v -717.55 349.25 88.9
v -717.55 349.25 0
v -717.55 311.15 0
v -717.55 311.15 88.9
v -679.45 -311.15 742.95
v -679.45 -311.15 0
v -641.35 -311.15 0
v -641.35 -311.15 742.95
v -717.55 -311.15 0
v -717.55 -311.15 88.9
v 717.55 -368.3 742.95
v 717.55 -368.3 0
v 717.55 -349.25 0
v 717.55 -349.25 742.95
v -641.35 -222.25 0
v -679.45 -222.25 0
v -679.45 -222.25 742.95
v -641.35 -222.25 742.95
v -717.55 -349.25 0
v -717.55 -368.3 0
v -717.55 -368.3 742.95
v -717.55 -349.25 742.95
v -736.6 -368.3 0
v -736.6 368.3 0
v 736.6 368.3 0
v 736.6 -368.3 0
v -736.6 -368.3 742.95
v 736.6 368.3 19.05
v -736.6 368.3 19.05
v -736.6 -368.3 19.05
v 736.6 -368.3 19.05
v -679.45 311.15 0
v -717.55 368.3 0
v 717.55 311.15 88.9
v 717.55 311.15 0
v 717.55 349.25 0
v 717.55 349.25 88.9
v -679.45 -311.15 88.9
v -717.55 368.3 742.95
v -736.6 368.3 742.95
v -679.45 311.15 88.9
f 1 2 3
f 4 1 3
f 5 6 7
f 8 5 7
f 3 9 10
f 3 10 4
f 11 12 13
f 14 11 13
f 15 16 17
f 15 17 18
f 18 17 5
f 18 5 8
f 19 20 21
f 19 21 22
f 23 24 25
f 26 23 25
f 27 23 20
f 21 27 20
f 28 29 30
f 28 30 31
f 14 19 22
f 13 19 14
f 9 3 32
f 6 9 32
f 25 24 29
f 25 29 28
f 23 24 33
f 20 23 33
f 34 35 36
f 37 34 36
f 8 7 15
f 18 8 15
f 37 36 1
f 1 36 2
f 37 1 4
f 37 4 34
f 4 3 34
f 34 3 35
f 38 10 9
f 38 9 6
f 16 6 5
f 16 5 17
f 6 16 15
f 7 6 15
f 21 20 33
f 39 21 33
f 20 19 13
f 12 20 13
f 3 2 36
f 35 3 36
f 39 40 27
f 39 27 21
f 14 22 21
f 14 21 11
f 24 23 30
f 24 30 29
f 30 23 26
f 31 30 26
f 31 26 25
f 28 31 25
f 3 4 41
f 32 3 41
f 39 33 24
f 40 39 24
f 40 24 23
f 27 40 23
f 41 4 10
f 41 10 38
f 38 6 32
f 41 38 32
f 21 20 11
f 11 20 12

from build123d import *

# Parameters (mm, degrees)
F4_W      = 1473.2
F4_H      = 736.6
F7_DEPTH  = 19.05
F8_DEPTH  = 742.95
F5_W      = 1435.1
F5_H      = 19.05
F9_DEPTH  = 742.95
F10_DEPTH = 88.9
F5_W_2    = 38.1
F5_H_2    = 622.3
F11_DEPTH = 88.9
F6_W      = 38.1
F6_H      = 88.9
F12_DEPTH = 742.95


# Not quite as in the source:
# - a length typed as a fraction of an inch, garbled in the dataset ("3 / 203.2 mm" for 3/8 in), is restored


with BuildPart() as f7:
    # F4 (on Top) → F7 (new body)
    with BuildSketch(Plane.XY):
        Rectangle(F4_W, F4_H)
    extrude(amount=F7_DEPTH)


with BuildPart() as f8:
    # F5 (on Top) → F8 (new body)
    with BuildSketch(Plane.XY):
        Polygon((-717.55, 368.3), (-736.6, 368.3), (-736.6, -368.3), (-717.55, -368.3), (-717.55, -349.25), (-717.55, -311.15), (-717.55, 311.15), (-717.55, 349.25), align=None)
    extrude(amount=F8_DEPTH)


with BuildPart() as f9:
    # F5 (on Top) → F9 (new body)
    with BuildSketch(Plane.XY):
        with Locations((0, -358.775)):
            Rectangle(F5_W, F5_H)
    extrude(amount=F9_DEPTH)


with BuildPart() as f10:
    # F5 (on Top) → F10 (new body)
    with BuildSketch(Plane.XY):
        Polygon((717.55, 349.25), (-717.55, 349.25), (-717.55, 311.15), (-679.45, 311.15), (-57.15, 311.15), (-19.05, 311.15), (679.45, 311.15), (717.55, 311.15), align=None)
    extrude(amount=F10_DEPTH)


with BuildPart() as f11:
    # F5 (on Top) → F11 (new body)
    with BuildSketch(Plane.XY):
        with Locations((-698.5, 0)):
            Rectangle(F5_W_2, F5_H_2)
    extrude(amount=F11_DEPTH)


with BuildPart() as f12:
    # F6 (on Top) → F12 (new body)
    with BuildSketch(Plane.XY):
        with Locations((-660.4, -266.7)):
            Rectangle(F6_W, F6_H)
    extrude(amount=F12_DEPTH)


solid = Compound([f7.part, f8.part, f9.part, f10.part, f11.part, f12.part])
